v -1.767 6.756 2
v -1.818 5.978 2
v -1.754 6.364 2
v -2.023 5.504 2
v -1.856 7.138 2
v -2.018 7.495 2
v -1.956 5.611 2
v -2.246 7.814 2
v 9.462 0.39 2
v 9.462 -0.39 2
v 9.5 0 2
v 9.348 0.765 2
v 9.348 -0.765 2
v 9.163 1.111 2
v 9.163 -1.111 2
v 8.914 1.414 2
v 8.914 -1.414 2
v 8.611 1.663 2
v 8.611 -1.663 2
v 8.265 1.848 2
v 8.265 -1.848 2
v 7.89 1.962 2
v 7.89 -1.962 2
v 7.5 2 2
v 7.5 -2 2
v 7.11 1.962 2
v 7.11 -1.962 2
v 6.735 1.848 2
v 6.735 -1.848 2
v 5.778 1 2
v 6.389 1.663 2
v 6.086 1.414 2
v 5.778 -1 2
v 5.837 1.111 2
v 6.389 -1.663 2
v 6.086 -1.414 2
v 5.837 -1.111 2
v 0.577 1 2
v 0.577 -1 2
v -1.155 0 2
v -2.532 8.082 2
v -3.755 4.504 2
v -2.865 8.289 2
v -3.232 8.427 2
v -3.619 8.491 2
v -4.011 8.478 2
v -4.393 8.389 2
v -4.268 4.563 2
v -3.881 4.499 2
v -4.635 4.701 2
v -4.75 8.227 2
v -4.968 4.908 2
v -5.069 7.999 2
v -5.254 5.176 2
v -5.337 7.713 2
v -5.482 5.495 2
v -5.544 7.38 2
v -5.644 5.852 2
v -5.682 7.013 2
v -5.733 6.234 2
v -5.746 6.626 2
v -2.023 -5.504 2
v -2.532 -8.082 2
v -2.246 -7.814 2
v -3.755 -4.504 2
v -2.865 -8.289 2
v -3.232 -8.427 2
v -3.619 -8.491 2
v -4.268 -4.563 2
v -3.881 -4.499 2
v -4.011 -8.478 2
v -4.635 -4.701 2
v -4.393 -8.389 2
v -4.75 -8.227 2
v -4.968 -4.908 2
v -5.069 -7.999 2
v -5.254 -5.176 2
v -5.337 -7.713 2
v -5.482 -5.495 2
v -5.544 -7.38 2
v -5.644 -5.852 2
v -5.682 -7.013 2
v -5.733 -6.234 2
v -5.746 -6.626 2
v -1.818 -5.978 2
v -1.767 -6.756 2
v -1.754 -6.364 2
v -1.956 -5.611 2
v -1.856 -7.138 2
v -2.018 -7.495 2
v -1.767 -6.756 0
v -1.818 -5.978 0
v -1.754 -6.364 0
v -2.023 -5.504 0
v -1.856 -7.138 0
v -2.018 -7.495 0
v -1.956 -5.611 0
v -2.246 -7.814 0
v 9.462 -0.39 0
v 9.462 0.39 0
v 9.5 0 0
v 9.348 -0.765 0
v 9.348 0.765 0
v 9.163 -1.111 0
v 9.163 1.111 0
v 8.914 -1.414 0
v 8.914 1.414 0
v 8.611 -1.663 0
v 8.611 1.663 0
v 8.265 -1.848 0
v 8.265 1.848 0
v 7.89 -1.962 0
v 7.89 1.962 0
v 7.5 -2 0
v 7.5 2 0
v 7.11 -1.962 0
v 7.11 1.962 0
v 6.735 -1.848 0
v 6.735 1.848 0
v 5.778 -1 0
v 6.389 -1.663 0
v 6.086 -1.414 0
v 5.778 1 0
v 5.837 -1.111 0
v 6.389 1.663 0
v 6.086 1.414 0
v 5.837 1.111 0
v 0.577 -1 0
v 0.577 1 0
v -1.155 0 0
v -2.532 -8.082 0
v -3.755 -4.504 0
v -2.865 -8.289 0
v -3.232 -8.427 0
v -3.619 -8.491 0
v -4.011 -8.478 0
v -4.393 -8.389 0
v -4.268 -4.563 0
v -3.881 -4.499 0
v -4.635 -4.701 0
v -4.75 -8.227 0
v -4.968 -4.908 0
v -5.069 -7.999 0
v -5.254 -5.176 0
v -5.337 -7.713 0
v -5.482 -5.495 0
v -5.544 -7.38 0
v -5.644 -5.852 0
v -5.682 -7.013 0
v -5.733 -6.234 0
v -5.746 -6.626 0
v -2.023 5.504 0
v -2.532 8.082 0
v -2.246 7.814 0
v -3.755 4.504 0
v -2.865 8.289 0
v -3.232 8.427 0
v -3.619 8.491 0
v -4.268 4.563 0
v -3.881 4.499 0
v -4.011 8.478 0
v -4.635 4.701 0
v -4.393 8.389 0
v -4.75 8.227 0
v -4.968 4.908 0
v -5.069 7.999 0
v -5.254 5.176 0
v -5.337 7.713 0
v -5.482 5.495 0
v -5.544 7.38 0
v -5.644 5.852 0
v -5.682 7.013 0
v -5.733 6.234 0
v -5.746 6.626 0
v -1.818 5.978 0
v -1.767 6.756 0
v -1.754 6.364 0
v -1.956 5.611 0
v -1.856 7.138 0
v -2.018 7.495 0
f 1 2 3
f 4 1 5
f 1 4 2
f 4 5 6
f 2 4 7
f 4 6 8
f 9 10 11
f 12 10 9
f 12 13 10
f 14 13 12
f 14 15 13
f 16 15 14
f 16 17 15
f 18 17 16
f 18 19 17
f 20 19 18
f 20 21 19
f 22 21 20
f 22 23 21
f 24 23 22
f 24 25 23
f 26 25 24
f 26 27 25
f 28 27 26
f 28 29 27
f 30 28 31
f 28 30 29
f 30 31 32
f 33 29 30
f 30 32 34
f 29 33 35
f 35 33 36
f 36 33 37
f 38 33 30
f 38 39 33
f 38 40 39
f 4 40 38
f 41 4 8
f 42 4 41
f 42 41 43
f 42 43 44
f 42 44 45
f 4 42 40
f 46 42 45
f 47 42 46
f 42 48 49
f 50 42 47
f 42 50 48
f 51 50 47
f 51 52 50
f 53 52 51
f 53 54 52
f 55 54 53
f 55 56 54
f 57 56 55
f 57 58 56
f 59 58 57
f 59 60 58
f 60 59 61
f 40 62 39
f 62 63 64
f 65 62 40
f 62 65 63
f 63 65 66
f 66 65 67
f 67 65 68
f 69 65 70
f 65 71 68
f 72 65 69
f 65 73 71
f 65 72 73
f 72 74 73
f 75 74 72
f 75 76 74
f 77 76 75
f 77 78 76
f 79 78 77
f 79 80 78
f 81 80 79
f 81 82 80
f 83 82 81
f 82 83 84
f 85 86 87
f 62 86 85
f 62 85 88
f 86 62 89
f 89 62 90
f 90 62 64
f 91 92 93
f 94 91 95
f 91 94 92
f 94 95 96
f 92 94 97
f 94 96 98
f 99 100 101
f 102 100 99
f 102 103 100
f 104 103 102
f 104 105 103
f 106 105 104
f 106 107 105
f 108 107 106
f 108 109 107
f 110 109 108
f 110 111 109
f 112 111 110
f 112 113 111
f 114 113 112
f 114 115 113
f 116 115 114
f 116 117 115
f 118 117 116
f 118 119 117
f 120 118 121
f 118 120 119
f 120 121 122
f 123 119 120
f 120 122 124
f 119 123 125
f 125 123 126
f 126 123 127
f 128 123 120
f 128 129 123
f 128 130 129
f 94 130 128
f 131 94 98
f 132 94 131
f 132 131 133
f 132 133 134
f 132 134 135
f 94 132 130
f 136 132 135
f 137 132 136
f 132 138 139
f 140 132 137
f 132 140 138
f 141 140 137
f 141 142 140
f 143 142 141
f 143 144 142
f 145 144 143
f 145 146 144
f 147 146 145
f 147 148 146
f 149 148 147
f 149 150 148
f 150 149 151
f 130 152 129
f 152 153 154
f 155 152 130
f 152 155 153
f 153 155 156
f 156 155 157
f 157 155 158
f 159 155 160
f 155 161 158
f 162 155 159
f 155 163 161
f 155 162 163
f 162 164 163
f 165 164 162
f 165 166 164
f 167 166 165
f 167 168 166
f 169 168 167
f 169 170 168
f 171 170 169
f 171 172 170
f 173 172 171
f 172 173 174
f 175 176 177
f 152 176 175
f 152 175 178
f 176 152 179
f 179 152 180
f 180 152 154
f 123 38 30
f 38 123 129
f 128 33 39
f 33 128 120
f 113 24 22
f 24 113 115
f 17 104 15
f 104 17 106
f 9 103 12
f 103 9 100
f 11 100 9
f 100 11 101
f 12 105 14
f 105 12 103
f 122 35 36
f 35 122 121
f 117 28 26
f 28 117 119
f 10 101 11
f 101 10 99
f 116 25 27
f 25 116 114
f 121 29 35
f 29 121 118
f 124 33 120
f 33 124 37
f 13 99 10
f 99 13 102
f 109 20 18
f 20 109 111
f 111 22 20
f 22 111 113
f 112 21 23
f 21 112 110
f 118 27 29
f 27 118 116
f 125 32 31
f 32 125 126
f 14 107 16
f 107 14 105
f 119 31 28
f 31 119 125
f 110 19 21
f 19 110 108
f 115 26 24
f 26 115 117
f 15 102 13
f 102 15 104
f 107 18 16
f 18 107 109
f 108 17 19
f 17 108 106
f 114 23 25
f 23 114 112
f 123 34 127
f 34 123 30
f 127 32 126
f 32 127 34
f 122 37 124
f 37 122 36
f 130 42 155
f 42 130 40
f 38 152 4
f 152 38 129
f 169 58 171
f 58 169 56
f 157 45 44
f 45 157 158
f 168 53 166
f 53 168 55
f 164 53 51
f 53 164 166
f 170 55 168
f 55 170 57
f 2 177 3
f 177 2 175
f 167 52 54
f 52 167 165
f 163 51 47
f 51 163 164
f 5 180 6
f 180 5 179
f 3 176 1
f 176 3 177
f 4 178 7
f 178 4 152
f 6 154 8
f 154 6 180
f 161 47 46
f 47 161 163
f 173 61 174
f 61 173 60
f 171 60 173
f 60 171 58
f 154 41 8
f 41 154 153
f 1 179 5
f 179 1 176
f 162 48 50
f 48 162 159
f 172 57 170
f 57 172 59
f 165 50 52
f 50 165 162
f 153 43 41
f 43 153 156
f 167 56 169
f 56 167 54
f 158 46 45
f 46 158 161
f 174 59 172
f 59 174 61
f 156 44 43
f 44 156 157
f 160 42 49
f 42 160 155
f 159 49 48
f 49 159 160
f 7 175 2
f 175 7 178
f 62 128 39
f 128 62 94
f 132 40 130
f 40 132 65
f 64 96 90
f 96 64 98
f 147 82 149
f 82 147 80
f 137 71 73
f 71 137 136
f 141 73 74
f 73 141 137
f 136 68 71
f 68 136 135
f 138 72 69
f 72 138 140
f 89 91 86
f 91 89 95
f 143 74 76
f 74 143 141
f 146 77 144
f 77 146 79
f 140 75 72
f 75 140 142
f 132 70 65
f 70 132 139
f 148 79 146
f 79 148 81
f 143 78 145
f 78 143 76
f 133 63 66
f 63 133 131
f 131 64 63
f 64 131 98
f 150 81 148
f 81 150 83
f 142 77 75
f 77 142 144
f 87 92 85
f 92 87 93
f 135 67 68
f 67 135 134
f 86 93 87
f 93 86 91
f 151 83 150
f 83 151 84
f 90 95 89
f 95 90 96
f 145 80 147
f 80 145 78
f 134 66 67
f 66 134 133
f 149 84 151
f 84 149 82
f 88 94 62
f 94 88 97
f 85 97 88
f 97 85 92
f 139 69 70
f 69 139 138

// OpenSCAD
// Flexy-Frame v4 by Gyrobot
// http://www.gyrobot.co.uk
//
//Standard Males were generated with the following params :
//
//    type = "male"
//    diameter_of_connection = 4
//    pitch_circle_diameter = 15
//    limb_height = 2
//    limb_thickness = 2
//
//Standard Females were generated with the following params :
//
//    type = "female"
//    diameter_of_connection = 4
//    pitch_circle_diameter = 40
//    limb_height = 2
//    limb_thickness = 3
//
// preview[view:east, tilt:top]

type = "male" ; // [male,female]
number_of_lobes = 3 ;// [2:100]
web_plate_height = 0;
diameter_of_connection = 4 ;
pitch_circle_diameter = 15 ;
male_limb_height = 2 ; // 1mm is automatically added to this for Female limb height
limb_thickness = 2 ;

// Start of Code

n=number_of_lobes ;
ph=web_plate_height ;
d=diameter_of_connection ;
pcd=pitch_circle_diameter ;
h=male_limb_height ;
t=limb_thickness ;
a=360/n ;

if (type == "male")
	male();

if (type == "female")
	female();

$fn=32*1 ;	

module male ()
{
	if (ph > 0)
		assign ($fn=n)
		cylinder (h=ph, r=pcd/2-d) ;

	for (ia = [0:a:360])
	{
		rotate (ia,[0,0,1])
		{
			translate ([0,-t/2,0])
			cube ([pcd/2,t,h]) ;
			translate ([pcd/2,0,0])
			cylinder (h=h, r=d/2) ;

		}
	}
}

module female ()
{
	difference ()
	{
		union ()
		{
			if (ph > 0)
				assign ($fn=n)
				cylinder (h=ph, r=pcd/2+d) ;

			for (ia = [0:a:360])
			{
				rotate (ia,[0,0,1])
				{
					translate ([0,-t/2,0])
						cube ([pcd/2,t,h+1]) ;
					translate ([pcd/2,0,0])
						cylinder (h=h+1, r=d) ;
					linear_extrude (height = h+1, convexity= 3)
						polygon (points=[[pcd/2-d*1.5,t/-2],[pcd/2-d*1.5,t/2],[pcd/2,d],[pcd/2,-d]]);
				}
			}
		}
		for (ia = [0:a:360])
		{
			rotate (ia,[0,0,1])
			{
				translate ([pcd/2,0,1])
					{
						cylinder (h=ph+2, r=d/2) ;
						translate ([0,-d/4,0])
						cube ([pcd/2,d/2,ph+2]) ;
					}
			}
		}
	}
}
